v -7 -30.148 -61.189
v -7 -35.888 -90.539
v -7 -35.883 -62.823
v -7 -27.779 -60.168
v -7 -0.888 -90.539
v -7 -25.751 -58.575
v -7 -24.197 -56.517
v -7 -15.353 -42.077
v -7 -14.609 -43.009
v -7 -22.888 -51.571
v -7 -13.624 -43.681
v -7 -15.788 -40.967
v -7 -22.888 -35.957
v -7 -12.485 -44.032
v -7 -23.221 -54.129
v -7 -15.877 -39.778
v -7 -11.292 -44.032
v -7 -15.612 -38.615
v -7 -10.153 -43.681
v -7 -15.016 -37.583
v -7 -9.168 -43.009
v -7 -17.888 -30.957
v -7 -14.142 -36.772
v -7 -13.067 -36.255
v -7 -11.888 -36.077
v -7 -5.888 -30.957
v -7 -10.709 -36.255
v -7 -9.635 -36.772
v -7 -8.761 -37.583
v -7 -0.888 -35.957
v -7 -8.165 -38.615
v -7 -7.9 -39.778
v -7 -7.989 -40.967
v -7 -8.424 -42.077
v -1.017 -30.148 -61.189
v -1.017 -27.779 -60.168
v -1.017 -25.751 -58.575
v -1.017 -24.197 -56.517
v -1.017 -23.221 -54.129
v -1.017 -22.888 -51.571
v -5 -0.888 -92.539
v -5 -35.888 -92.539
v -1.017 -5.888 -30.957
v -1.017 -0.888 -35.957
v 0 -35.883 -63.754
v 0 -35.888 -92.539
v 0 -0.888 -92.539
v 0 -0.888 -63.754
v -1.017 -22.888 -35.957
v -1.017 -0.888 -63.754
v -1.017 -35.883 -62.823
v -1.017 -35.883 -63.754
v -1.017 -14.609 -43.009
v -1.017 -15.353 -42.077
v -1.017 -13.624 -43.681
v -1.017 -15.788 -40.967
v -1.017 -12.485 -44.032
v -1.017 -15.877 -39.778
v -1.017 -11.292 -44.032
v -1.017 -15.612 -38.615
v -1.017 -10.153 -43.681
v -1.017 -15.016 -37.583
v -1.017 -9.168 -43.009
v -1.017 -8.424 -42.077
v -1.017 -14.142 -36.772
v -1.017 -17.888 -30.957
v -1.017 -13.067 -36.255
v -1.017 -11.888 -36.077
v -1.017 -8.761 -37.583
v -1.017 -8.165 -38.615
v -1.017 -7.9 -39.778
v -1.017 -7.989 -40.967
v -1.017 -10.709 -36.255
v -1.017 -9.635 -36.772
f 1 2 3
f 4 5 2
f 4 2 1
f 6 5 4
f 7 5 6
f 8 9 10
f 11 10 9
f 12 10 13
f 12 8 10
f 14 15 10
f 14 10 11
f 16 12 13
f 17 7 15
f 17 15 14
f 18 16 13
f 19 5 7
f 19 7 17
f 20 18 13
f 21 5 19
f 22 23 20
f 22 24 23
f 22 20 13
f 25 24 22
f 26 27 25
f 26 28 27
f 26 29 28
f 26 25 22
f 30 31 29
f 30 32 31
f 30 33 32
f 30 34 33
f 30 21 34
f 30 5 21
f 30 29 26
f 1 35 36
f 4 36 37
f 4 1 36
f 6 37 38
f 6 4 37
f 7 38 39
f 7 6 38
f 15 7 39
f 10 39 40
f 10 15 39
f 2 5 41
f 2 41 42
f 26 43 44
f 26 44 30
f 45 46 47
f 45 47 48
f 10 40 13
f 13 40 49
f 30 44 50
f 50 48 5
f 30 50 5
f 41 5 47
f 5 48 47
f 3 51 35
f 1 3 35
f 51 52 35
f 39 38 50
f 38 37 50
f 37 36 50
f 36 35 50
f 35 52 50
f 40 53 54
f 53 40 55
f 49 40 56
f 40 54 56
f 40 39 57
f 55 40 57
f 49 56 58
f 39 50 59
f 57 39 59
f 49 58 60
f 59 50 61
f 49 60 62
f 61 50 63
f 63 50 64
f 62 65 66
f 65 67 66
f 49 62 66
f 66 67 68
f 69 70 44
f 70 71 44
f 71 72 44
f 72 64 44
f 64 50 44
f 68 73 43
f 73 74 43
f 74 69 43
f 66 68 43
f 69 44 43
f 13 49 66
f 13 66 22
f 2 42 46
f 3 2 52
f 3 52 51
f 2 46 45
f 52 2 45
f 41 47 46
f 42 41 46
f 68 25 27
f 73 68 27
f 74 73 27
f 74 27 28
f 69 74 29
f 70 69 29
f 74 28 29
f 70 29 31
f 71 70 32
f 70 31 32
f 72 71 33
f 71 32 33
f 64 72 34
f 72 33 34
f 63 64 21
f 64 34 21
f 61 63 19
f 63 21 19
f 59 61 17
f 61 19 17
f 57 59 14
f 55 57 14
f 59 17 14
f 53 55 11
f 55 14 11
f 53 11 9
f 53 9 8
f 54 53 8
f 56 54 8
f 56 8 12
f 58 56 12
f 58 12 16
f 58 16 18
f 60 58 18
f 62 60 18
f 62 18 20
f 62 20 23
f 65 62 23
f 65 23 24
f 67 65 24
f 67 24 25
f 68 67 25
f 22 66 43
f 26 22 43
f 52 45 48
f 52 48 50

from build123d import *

# Parameters (mm, degrees)
EXTRUDE_1_DEPTH     = 7
FILLET_1_R          = 10
CHAMFER_1_SIZE      = 5
CHAMFER_2_SIZE      = 2
SKETCH_2_W          = 22.368466887
SKETCH_2_H          = 53.156625086
CUT_EXTRUDE_1_DEPTH = 100.184312104
SKETCH_3_R          = 4
CUT_EXTRUDE_2_DEPTH = 100.50128502


with BuildPart() as part:
    # Эскиз1 → Вытянуть1 (new body)
    with BuildSketch(Plane(origin=(0, 0, 0), x_dir=(0, 0, -1), z_dir=(1, 0, 0))):
        Polygon((62.822655934, -35.882923805), (59.120013374, -22.888409733), (30.956731402, -22.888409733), (30.956731402, -0.888409733), (92.539330922, -0.888409733), (92.539330922, -35.888409733), align=None)
    extrude(amount=-EXTRUDE_1_DEPTH)

    # Скругление1
    fillet_1_edges = [part.edges().sort_by_distance(p)[0] for p in [
        (-3.5, -22.888409733, -59.120013374),
    ]]
    fillet(fillet_1_edges, radius=FILLET_1_R)

    # Фаска1
    chamfer_1_edges = [part.edges().sort_by_distance(p)[0] for p in [
        (-3.5, -22.888409733, -30.956731402),
        (-3.5, -0.888409733, -30.956731402),
    ]]
    chamfer(chamfer_1_edges, length=CHAMFER_1_SIZE)

    # Фаска2
    chamfer_2_edges = [part.edges().sort_by_distance(p)[0] for p in [
        (-7, -18.388409733, -92.539330922),
    ]]
    chamfer(chamfer_2_edges, length=CHAMFER_2_SIZE)

    # Эскиз2 → Вырез-Вытянуть1 (cut, through all)
    with BuildSketch(Plane(origin=(0, -0.888409733, 0), x_dir=(-1, 0, 0), z_dir=(0, 1, 0))):
        with Locations((-10.167320296, -37.175286002)):
            Rectangle(SKETCH_2_W, SKETCH_2_H)
    extrude(amount=-CUT_EXTRUDE_1_DEPTH, mode=Mode.SUBTRACT)

    # Эскиз3 → Вырез-Вытянуть2 (cut, through all)
    with BuildSketch(Plane.ZY.offset(7)):
        with Locations((-40.076852625, -11.888409733)):
            Circle(SKETCH_3_R)
    extrude(amount=-CUT_EXTRUDE_2_DEPTH, mode=Mode.SUBTRACT)


solid = part.part
